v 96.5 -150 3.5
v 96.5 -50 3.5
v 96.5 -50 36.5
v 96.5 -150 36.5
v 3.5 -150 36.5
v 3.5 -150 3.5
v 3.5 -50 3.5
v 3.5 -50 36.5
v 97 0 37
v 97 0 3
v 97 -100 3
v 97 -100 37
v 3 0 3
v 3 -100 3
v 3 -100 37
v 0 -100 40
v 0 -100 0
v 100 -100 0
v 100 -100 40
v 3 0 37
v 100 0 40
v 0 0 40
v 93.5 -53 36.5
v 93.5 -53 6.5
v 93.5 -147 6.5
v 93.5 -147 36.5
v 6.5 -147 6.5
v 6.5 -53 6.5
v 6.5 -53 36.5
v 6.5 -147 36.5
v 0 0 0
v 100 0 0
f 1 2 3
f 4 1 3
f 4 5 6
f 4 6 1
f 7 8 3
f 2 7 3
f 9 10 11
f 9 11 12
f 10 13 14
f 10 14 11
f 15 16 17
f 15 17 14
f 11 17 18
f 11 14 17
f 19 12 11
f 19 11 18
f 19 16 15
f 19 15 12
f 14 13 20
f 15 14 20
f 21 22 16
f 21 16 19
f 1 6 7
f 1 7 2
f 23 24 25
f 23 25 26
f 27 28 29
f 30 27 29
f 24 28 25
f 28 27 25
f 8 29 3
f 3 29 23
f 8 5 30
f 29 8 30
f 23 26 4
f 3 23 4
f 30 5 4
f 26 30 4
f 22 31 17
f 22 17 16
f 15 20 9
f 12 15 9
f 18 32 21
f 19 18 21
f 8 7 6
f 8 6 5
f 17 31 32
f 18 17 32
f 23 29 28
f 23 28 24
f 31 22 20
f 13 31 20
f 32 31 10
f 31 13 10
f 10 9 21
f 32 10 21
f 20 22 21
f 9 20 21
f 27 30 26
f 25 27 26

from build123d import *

# Parameters (mm, degrees)
F0_W     = 100
F0_H     = 40
F0_W_2   = 94
F0_H_2   = 34
F1_DEPTH = 100
F2_W     = 93
F2_H     = 33
F3_DEPTH = 50
F4_T     = -3


with BuildPart() as f1:
    # F0 (on Front) → F1 (new body)
    with BuildSketch(Plane.XZ):
        with Locations((50, 20)):
            Rectangle(F0_W, F0_H)
        with Locations((50, 20)):
            Rectangle(F0_W_2, F0_H_2, mode=Mode.SUBTRACT)
    extrude(amount=F1_DEPTH)


with BuildPart() as f3:
    # F2 (on face) → F3 (new body, symmetric)
    with BuildSketch(Plane.XZ.offset(100)):
        with Locations((50, 20)):
            Rectangle(F2_W, F2_H)
    extrude(amount=F3_DEPTH, both=True)

    # F4
    f4_openings = [f3.faces().sort_by_distance(p)[0] for p in [
        (50, -100, 36.5),
    ]]
    offset(amount=F4_T, openings=f4_openings)


solid = Compound([f1.part, f3.part])
